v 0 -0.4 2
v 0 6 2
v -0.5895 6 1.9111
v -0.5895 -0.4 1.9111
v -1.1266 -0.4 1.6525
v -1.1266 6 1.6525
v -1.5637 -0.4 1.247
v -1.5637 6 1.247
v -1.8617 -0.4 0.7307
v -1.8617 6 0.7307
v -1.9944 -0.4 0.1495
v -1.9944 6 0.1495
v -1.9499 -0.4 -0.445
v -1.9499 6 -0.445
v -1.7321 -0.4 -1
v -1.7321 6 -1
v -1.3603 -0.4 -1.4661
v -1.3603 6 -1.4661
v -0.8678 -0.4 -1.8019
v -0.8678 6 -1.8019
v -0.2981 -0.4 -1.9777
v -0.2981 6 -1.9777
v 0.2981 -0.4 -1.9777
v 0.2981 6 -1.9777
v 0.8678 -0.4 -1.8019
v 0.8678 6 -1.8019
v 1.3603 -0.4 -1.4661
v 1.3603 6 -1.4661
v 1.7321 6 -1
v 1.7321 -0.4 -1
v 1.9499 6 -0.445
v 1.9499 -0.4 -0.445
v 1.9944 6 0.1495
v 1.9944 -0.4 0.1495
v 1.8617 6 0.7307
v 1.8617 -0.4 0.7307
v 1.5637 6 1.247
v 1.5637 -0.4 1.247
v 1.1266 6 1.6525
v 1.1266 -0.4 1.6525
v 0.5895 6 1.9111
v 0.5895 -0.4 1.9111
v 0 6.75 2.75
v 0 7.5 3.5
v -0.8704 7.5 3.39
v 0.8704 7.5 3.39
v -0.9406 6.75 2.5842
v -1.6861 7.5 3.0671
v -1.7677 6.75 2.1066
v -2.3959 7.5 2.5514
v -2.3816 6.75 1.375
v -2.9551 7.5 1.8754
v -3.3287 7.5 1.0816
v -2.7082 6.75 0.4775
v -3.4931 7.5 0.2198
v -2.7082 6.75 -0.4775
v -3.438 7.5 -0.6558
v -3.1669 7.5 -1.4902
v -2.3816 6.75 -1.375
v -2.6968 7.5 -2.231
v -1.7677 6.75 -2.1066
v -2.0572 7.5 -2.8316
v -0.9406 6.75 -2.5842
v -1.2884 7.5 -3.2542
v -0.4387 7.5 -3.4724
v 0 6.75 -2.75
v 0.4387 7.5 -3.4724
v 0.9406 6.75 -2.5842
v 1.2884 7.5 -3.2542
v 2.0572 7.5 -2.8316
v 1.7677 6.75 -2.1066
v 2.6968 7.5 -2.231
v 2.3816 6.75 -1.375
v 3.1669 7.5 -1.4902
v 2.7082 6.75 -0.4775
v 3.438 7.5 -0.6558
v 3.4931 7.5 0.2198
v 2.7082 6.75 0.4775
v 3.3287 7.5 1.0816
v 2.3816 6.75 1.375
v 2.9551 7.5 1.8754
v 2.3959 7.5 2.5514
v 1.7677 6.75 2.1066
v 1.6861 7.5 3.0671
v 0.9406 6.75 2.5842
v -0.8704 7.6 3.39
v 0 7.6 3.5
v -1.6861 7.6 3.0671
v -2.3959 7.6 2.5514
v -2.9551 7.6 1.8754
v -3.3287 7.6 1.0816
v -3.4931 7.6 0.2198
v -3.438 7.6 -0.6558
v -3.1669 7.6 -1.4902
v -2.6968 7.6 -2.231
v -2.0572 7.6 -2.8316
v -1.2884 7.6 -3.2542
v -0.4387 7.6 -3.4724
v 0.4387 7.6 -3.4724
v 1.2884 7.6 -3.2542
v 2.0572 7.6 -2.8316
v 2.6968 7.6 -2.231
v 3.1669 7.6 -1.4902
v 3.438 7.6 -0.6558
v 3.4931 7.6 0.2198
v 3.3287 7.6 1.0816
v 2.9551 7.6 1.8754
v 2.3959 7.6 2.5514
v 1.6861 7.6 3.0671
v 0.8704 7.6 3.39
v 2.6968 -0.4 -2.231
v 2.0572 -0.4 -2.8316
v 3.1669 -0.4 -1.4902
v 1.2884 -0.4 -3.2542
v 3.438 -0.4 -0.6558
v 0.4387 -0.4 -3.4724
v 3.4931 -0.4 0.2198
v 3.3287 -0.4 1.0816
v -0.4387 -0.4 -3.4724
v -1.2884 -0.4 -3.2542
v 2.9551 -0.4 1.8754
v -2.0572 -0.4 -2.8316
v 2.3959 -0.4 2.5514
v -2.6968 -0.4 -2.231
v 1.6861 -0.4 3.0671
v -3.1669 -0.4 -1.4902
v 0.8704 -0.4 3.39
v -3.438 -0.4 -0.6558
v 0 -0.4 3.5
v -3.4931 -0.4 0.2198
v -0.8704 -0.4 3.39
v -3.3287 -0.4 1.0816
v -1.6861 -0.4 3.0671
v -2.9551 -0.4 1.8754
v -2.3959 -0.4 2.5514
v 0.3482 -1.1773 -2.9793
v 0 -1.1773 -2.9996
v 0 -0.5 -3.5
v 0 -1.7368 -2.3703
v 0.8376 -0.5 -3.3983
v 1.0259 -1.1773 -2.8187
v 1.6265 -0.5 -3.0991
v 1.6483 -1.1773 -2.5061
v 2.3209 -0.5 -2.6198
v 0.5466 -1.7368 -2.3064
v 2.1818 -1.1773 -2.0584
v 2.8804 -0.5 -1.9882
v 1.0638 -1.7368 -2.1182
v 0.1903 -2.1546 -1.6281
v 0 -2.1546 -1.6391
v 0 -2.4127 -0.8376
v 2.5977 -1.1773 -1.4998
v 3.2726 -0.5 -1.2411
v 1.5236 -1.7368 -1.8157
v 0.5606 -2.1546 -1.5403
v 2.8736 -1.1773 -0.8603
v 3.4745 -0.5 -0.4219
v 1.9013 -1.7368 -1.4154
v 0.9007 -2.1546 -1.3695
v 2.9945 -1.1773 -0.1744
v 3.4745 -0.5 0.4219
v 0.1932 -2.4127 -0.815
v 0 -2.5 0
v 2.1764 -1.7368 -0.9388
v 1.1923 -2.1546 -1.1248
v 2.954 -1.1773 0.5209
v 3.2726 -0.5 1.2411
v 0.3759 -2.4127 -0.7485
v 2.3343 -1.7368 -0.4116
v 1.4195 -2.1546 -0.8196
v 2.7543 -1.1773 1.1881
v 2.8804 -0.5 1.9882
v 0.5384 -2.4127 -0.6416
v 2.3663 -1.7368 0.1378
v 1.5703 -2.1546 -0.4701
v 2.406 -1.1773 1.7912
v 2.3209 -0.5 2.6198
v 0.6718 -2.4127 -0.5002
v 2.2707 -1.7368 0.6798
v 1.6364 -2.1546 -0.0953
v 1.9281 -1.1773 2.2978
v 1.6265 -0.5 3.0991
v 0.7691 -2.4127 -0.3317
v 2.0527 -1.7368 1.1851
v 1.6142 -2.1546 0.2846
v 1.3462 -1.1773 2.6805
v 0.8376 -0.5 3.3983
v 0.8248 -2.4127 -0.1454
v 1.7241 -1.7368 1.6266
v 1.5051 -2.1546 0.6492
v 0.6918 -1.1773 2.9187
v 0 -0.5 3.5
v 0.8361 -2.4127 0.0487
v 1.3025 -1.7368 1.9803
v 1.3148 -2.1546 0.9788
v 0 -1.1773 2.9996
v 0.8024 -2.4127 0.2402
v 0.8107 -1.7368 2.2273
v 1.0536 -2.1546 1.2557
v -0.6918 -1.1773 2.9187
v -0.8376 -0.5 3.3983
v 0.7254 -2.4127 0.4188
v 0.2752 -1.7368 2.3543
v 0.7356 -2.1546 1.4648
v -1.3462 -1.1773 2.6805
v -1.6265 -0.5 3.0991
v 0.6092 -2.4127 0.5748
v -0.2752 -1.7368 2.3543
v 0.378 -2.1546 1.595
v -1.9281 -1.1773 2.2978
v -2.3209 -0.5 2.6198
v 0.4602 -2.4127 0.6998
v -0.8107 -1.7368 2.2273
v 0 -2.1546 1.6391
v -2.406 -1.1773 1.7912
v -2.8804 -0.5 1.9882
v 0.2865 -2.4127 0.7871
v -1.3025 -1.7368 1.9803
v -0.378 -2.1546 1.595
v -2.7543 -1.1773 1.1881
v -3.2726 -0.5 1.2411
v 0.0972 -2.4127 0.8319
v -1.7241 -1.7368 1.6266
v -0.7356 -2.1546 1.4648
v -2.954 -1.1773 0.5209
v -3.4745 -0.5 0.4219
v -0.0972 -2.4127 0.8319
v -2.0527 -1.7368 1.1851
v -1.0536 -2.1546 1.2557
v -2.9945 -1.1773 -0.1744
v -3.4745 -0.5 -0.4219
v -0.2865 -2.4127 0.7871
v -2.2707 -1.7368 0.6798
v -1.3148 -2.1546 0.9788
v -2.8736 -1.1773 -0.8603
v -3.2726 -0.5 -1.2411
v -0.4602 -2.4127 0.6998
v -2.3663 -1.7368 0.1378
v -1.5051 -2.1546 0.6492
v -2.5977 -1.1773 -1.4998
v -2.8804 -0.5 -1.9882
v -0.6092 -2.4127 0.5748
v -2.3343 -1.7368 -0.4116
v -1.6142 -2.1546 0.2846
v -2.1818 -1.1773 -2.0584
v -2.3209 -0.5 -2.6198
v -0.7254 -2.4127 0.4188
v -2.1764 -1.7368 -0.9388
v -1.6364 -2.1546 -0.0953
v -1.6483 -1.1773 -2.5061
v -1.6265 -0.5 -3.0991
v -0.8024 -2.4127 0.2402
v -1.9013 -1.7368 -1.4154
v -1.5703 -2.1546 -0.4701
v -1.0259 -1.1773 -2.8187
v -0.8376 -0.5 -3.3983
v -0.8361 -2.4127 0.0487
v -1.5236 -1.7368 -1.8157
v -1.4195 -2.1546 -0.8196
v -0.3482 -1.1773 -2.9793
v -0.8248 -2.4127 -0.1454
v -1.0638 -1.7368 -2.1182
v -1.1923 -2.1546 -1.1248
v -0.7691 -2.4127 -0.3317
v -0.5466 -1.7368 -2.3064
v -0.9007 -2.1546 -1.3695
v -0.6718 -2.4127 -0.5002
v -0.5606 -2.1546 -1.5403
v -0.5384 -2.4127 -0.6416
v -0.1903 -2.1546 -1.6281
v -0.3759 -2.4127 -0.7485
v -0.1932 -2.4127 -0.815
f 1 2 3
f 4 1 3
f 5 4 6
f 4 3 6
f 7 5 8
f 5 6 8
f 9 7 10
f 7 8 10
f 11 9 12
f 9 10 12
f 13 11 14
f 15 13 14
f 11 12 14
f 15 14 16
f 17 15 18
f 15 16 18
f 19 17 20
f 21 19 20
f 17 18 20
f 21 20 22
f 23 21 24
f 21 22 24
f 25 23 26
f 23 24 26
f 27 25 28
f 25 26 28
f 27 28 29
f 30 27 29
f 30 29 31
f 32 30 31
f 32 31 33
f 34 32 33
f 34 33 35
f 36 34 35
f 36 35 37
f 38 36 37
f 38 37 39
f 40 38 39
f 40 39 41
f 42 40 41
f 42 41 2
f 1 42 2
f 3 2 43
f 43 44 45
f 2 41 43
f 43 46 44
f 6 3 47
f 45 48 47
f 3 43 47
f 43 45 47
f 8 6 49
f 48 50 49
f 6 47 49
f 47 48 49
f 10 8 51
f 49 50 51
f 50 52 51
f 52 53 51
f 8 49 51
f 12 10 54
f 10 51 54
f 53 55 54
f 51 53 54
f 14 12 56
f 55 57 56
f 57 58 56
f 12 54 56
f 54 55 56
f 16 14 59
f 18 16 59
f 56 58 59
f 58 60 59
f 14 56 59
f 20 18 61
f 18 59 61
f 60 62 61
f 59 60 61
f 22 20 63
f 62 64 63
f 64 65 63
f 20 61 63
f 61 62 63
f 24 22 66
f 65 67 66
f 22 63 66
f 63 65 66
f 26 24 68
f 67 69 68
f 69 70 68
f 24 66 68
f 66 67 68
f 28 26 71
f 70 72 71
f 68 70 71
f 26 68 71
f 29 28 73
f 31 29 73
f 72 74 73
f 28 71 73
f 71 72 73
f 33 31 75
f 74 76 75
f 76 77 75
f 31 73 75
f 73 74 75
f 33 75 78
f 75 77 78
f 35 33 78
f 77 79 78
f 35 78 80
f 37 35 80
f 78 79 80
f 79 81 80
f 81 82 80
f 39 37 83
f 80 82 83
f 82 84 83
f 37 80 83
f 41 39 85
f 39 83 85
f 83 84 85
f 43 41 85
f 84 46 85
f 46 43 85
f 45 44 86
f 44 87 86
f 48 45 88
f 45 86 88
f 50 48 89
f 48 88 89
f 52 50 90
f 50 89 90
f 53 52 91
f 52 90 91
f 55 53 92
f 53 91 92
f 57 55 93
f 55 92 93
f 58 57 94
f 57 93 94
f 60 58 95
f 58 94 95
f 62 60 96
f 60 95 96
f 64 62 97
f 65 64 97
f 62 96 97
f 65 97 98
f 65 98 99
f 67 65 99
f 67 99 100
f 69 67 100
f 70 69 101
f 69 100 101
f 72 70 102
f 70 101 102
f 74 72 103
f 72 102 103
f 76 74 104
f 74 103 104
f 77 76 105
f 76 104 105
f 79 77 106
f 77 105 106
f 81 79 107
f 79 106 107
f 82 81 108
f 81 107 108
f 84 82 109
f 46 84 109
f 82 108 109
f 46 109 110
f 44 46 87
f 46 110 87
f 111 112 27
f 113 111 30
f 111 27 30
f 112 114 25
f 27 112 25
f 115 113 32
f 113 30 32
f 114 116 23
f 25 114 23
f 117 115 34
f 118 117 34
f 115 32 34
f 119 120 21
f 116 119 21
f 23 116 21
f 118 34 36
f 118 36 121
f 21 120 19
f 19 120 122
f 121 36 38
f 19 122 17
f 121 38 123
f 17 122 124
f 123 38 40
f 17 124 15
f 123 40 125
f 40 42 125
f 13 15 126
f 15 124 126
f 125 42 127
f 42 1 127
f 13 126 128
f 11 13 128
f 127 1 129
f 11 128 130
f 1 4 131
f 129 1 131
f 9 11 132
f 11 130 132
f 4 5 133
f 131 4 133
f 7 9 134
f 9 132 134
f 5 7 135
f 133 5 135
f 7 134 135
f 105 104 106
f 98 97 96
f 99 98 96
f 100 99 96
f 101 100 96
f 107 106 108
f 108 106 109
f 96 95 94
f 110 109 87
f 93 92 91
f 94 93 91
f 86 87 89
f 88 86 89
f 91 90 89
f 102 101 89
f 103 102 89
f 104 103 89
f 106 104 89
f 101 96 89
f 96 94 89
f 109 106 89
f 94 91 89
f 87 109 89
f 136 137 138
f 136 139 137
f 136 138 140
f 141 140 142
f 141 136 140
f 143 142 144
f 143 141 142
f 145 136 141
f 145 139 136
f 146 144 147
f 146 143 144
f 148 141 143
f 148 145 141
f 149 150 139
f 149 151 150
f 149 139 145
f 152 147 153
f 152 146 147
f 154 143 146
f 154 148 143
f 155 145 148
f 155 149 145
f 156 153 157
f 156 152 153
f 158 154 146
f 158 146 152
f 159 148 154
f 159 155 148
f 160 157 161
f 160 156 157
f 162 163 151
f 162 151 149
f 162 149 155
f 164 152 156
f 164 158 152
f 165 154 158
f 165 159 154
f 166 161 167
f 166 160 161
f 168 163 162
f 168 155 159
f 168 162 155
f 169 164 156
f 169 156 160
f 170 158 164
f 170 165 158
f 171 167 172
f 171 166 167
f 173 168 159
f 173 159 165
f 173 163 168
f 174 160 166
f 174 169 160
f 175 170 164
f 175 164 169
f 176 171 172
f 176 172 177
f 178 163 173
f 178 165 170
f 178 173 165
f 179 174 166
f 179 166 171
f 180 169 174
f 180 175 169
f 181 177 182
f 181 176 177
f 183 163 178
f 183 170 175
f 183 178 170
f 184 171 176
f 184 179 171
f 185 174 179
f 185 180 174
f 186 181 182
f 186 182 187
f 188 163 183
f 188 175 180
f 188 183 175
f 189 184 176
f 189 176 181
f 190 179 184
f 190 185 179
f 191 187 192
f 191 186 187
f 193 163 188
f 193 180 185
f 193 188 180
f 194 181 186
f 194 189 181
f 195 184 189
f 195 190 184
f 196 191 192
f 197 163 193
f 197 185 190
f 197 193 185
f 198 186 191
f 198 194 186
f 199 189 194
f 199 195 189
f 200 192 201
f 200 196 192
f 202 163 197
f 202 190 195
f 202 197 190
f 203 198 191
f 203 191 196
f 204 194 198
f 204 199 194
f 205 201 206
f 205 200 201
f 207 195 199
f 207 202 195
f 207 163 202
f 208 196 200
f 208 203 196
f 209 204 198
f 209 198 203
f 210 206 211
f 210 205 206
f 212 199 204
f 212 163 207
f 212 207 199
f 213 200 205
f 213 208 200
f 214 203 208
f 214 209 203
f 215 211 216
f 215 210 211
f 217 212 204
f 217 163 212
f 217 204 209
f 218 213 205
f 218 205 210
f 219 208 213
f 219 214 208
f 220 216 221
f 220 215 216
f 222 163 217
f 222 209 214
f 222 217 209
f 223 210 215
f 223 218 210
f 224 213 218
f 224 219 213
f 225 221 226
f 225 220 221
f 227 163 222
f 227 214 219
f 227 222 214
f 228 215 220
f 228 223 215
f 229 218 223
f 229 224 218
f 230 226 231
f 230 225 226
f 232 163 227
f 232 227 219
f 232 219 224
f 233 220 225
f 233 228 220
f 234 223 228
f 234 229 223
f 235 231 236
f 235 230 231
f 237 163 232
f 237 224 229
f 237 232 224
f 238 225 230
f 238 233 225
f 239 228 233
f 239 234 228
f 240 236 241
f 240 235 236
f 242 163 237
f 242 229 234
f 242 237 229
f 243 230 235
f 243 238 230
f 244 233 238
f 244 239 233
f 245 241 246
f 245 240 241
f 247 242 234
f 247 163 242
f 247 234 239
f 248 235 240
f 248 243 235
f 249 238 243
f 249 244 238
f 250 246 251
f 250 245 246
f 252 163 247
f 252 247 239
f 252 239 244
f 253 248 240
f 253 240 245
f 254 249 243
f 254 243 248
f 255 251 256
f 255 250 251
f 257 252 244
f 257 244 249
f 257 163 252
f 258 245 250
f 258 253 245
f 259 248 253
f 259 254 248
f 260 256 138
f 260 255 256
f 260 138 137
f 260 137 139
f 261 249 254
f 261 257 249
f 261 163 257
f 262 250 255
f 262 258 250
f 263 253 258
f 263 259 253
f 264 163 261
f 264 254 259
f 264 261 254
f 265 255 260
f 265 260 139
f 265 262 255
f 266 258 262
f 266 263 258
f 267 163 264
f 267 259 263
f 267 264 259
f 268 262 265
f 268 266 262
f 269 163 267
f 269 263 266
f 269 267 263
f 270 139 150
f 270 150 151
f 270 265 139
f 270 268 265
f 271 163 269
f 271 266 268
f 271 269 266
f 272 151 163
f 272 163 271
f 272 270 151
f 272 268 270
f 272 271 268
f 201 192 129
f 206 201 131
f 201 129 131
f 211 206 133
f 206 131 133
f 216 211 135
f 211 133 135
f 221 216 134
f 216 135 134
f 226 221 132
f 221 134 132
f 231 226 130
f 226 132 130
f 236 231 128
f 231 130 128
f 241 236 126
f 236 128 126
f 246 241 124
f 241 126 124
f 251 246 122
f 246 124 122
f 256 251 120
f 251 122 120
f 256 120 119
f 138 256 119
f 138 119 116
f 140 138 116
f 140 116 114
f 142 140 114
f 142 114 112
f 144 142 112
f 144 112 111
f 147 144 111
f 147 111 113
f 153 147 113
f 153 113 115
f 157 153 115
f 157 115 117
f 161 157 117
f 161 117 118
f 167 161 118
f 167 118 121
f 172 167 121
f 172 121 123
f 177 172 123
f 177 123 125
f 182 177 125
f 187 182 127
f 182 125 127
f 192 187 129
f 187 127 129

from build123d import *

# Parameters (mm, degrees)
EXTRUDE_1_DEPTH      = 0.4
EXTRUDE_1_DEPTH_BACK = 2
SKETCH_2_R           = 2
SKETCH_3_R           = 3.5
EXTRUDE_2_DEPTH      = 0.1
DOME_1_FACE_RADIUS   = 3.5
DOME_1_HEIGHT        = 2


with BuildPart() as part:
    # Эскиз1 → Revolve 344 (revolve)
    with BuildSketch(Plane.XY, mode=Mode.PRIVATE) as revolve_344_sk:
        with BuildLine():
            Line((0, 0), (1.6, 0))
            ThreePointArc((1.6, 0), (1.882842712, 0.117157288), (2, 0.4))
            Line((2, 0.4), (2, 6))
            Line((2, 6), (3.5, 7.5))
            Line((3.5, 7.5), (3.5, 7.6))
            Line((3.5, 7.6), (0, 7.6))
            Line((0, 7.6), (0, 0))
        make_face()
    revolve(revolve_344_sk.sketch.rotate(Axis((0, 11.283972125, 0), (0, -1, 0)), 90), axis=Axis((0, 11.283972125, 0), (0, -1, 0)))

    # Эскиз2 → Вытянуть1 (add, two sides: drawn at the far end of the back side and taken through both)
    with BuildSketch(Plane.XZ.offset(-EXTRUDE_1_DEPTH_BACK)):
        with Locations(Location((0, 0, 0), (0, 0, 90))):
            Circle(SKETCH_2_R)
    extrude(amount=EXTRUDE_1_DEPTH + EXTRUDE_1_DEPTH_BACK)

    # Эскиз3 → Вытянуть2 (add)
    with BuildSketch(Plane.XZ.offset(0.4)):
        with Locations(Location((0, 0, 0), (0, 0, 90))):
            Circle(SKETCH_3_R)
    extrude(amount=EXTRUDE_2_DEPTH)

    # Купол1: a dome of height H over a round flat face of radius A is a cap of a sphere of radius (A * A + H * H) / (2 * H)
    dome_1_r = (DOME_1_FACE_RADIUS * DOME_1_FACE_RADIUS + DOME_1_HEIGHT * DOME_1_HEIGHT) / (2 * DOME_1_HEIGHT)
    dome_1_base = Plane((0, -0.5, 0), z_dir=(0, -1, 0))
    with Locations(dome_1_base.offset(DOME_1_HEIGHT - dome_1_r)):
        dome_1_ball = Sphere(dome_1_r, mode=Mode.PRIVATE)
    add(split(dome_1_ball, bisect_by=dome_1_base, keep=Keep.TOP, mode=Mode.PRIVATE))


solid = part.part
